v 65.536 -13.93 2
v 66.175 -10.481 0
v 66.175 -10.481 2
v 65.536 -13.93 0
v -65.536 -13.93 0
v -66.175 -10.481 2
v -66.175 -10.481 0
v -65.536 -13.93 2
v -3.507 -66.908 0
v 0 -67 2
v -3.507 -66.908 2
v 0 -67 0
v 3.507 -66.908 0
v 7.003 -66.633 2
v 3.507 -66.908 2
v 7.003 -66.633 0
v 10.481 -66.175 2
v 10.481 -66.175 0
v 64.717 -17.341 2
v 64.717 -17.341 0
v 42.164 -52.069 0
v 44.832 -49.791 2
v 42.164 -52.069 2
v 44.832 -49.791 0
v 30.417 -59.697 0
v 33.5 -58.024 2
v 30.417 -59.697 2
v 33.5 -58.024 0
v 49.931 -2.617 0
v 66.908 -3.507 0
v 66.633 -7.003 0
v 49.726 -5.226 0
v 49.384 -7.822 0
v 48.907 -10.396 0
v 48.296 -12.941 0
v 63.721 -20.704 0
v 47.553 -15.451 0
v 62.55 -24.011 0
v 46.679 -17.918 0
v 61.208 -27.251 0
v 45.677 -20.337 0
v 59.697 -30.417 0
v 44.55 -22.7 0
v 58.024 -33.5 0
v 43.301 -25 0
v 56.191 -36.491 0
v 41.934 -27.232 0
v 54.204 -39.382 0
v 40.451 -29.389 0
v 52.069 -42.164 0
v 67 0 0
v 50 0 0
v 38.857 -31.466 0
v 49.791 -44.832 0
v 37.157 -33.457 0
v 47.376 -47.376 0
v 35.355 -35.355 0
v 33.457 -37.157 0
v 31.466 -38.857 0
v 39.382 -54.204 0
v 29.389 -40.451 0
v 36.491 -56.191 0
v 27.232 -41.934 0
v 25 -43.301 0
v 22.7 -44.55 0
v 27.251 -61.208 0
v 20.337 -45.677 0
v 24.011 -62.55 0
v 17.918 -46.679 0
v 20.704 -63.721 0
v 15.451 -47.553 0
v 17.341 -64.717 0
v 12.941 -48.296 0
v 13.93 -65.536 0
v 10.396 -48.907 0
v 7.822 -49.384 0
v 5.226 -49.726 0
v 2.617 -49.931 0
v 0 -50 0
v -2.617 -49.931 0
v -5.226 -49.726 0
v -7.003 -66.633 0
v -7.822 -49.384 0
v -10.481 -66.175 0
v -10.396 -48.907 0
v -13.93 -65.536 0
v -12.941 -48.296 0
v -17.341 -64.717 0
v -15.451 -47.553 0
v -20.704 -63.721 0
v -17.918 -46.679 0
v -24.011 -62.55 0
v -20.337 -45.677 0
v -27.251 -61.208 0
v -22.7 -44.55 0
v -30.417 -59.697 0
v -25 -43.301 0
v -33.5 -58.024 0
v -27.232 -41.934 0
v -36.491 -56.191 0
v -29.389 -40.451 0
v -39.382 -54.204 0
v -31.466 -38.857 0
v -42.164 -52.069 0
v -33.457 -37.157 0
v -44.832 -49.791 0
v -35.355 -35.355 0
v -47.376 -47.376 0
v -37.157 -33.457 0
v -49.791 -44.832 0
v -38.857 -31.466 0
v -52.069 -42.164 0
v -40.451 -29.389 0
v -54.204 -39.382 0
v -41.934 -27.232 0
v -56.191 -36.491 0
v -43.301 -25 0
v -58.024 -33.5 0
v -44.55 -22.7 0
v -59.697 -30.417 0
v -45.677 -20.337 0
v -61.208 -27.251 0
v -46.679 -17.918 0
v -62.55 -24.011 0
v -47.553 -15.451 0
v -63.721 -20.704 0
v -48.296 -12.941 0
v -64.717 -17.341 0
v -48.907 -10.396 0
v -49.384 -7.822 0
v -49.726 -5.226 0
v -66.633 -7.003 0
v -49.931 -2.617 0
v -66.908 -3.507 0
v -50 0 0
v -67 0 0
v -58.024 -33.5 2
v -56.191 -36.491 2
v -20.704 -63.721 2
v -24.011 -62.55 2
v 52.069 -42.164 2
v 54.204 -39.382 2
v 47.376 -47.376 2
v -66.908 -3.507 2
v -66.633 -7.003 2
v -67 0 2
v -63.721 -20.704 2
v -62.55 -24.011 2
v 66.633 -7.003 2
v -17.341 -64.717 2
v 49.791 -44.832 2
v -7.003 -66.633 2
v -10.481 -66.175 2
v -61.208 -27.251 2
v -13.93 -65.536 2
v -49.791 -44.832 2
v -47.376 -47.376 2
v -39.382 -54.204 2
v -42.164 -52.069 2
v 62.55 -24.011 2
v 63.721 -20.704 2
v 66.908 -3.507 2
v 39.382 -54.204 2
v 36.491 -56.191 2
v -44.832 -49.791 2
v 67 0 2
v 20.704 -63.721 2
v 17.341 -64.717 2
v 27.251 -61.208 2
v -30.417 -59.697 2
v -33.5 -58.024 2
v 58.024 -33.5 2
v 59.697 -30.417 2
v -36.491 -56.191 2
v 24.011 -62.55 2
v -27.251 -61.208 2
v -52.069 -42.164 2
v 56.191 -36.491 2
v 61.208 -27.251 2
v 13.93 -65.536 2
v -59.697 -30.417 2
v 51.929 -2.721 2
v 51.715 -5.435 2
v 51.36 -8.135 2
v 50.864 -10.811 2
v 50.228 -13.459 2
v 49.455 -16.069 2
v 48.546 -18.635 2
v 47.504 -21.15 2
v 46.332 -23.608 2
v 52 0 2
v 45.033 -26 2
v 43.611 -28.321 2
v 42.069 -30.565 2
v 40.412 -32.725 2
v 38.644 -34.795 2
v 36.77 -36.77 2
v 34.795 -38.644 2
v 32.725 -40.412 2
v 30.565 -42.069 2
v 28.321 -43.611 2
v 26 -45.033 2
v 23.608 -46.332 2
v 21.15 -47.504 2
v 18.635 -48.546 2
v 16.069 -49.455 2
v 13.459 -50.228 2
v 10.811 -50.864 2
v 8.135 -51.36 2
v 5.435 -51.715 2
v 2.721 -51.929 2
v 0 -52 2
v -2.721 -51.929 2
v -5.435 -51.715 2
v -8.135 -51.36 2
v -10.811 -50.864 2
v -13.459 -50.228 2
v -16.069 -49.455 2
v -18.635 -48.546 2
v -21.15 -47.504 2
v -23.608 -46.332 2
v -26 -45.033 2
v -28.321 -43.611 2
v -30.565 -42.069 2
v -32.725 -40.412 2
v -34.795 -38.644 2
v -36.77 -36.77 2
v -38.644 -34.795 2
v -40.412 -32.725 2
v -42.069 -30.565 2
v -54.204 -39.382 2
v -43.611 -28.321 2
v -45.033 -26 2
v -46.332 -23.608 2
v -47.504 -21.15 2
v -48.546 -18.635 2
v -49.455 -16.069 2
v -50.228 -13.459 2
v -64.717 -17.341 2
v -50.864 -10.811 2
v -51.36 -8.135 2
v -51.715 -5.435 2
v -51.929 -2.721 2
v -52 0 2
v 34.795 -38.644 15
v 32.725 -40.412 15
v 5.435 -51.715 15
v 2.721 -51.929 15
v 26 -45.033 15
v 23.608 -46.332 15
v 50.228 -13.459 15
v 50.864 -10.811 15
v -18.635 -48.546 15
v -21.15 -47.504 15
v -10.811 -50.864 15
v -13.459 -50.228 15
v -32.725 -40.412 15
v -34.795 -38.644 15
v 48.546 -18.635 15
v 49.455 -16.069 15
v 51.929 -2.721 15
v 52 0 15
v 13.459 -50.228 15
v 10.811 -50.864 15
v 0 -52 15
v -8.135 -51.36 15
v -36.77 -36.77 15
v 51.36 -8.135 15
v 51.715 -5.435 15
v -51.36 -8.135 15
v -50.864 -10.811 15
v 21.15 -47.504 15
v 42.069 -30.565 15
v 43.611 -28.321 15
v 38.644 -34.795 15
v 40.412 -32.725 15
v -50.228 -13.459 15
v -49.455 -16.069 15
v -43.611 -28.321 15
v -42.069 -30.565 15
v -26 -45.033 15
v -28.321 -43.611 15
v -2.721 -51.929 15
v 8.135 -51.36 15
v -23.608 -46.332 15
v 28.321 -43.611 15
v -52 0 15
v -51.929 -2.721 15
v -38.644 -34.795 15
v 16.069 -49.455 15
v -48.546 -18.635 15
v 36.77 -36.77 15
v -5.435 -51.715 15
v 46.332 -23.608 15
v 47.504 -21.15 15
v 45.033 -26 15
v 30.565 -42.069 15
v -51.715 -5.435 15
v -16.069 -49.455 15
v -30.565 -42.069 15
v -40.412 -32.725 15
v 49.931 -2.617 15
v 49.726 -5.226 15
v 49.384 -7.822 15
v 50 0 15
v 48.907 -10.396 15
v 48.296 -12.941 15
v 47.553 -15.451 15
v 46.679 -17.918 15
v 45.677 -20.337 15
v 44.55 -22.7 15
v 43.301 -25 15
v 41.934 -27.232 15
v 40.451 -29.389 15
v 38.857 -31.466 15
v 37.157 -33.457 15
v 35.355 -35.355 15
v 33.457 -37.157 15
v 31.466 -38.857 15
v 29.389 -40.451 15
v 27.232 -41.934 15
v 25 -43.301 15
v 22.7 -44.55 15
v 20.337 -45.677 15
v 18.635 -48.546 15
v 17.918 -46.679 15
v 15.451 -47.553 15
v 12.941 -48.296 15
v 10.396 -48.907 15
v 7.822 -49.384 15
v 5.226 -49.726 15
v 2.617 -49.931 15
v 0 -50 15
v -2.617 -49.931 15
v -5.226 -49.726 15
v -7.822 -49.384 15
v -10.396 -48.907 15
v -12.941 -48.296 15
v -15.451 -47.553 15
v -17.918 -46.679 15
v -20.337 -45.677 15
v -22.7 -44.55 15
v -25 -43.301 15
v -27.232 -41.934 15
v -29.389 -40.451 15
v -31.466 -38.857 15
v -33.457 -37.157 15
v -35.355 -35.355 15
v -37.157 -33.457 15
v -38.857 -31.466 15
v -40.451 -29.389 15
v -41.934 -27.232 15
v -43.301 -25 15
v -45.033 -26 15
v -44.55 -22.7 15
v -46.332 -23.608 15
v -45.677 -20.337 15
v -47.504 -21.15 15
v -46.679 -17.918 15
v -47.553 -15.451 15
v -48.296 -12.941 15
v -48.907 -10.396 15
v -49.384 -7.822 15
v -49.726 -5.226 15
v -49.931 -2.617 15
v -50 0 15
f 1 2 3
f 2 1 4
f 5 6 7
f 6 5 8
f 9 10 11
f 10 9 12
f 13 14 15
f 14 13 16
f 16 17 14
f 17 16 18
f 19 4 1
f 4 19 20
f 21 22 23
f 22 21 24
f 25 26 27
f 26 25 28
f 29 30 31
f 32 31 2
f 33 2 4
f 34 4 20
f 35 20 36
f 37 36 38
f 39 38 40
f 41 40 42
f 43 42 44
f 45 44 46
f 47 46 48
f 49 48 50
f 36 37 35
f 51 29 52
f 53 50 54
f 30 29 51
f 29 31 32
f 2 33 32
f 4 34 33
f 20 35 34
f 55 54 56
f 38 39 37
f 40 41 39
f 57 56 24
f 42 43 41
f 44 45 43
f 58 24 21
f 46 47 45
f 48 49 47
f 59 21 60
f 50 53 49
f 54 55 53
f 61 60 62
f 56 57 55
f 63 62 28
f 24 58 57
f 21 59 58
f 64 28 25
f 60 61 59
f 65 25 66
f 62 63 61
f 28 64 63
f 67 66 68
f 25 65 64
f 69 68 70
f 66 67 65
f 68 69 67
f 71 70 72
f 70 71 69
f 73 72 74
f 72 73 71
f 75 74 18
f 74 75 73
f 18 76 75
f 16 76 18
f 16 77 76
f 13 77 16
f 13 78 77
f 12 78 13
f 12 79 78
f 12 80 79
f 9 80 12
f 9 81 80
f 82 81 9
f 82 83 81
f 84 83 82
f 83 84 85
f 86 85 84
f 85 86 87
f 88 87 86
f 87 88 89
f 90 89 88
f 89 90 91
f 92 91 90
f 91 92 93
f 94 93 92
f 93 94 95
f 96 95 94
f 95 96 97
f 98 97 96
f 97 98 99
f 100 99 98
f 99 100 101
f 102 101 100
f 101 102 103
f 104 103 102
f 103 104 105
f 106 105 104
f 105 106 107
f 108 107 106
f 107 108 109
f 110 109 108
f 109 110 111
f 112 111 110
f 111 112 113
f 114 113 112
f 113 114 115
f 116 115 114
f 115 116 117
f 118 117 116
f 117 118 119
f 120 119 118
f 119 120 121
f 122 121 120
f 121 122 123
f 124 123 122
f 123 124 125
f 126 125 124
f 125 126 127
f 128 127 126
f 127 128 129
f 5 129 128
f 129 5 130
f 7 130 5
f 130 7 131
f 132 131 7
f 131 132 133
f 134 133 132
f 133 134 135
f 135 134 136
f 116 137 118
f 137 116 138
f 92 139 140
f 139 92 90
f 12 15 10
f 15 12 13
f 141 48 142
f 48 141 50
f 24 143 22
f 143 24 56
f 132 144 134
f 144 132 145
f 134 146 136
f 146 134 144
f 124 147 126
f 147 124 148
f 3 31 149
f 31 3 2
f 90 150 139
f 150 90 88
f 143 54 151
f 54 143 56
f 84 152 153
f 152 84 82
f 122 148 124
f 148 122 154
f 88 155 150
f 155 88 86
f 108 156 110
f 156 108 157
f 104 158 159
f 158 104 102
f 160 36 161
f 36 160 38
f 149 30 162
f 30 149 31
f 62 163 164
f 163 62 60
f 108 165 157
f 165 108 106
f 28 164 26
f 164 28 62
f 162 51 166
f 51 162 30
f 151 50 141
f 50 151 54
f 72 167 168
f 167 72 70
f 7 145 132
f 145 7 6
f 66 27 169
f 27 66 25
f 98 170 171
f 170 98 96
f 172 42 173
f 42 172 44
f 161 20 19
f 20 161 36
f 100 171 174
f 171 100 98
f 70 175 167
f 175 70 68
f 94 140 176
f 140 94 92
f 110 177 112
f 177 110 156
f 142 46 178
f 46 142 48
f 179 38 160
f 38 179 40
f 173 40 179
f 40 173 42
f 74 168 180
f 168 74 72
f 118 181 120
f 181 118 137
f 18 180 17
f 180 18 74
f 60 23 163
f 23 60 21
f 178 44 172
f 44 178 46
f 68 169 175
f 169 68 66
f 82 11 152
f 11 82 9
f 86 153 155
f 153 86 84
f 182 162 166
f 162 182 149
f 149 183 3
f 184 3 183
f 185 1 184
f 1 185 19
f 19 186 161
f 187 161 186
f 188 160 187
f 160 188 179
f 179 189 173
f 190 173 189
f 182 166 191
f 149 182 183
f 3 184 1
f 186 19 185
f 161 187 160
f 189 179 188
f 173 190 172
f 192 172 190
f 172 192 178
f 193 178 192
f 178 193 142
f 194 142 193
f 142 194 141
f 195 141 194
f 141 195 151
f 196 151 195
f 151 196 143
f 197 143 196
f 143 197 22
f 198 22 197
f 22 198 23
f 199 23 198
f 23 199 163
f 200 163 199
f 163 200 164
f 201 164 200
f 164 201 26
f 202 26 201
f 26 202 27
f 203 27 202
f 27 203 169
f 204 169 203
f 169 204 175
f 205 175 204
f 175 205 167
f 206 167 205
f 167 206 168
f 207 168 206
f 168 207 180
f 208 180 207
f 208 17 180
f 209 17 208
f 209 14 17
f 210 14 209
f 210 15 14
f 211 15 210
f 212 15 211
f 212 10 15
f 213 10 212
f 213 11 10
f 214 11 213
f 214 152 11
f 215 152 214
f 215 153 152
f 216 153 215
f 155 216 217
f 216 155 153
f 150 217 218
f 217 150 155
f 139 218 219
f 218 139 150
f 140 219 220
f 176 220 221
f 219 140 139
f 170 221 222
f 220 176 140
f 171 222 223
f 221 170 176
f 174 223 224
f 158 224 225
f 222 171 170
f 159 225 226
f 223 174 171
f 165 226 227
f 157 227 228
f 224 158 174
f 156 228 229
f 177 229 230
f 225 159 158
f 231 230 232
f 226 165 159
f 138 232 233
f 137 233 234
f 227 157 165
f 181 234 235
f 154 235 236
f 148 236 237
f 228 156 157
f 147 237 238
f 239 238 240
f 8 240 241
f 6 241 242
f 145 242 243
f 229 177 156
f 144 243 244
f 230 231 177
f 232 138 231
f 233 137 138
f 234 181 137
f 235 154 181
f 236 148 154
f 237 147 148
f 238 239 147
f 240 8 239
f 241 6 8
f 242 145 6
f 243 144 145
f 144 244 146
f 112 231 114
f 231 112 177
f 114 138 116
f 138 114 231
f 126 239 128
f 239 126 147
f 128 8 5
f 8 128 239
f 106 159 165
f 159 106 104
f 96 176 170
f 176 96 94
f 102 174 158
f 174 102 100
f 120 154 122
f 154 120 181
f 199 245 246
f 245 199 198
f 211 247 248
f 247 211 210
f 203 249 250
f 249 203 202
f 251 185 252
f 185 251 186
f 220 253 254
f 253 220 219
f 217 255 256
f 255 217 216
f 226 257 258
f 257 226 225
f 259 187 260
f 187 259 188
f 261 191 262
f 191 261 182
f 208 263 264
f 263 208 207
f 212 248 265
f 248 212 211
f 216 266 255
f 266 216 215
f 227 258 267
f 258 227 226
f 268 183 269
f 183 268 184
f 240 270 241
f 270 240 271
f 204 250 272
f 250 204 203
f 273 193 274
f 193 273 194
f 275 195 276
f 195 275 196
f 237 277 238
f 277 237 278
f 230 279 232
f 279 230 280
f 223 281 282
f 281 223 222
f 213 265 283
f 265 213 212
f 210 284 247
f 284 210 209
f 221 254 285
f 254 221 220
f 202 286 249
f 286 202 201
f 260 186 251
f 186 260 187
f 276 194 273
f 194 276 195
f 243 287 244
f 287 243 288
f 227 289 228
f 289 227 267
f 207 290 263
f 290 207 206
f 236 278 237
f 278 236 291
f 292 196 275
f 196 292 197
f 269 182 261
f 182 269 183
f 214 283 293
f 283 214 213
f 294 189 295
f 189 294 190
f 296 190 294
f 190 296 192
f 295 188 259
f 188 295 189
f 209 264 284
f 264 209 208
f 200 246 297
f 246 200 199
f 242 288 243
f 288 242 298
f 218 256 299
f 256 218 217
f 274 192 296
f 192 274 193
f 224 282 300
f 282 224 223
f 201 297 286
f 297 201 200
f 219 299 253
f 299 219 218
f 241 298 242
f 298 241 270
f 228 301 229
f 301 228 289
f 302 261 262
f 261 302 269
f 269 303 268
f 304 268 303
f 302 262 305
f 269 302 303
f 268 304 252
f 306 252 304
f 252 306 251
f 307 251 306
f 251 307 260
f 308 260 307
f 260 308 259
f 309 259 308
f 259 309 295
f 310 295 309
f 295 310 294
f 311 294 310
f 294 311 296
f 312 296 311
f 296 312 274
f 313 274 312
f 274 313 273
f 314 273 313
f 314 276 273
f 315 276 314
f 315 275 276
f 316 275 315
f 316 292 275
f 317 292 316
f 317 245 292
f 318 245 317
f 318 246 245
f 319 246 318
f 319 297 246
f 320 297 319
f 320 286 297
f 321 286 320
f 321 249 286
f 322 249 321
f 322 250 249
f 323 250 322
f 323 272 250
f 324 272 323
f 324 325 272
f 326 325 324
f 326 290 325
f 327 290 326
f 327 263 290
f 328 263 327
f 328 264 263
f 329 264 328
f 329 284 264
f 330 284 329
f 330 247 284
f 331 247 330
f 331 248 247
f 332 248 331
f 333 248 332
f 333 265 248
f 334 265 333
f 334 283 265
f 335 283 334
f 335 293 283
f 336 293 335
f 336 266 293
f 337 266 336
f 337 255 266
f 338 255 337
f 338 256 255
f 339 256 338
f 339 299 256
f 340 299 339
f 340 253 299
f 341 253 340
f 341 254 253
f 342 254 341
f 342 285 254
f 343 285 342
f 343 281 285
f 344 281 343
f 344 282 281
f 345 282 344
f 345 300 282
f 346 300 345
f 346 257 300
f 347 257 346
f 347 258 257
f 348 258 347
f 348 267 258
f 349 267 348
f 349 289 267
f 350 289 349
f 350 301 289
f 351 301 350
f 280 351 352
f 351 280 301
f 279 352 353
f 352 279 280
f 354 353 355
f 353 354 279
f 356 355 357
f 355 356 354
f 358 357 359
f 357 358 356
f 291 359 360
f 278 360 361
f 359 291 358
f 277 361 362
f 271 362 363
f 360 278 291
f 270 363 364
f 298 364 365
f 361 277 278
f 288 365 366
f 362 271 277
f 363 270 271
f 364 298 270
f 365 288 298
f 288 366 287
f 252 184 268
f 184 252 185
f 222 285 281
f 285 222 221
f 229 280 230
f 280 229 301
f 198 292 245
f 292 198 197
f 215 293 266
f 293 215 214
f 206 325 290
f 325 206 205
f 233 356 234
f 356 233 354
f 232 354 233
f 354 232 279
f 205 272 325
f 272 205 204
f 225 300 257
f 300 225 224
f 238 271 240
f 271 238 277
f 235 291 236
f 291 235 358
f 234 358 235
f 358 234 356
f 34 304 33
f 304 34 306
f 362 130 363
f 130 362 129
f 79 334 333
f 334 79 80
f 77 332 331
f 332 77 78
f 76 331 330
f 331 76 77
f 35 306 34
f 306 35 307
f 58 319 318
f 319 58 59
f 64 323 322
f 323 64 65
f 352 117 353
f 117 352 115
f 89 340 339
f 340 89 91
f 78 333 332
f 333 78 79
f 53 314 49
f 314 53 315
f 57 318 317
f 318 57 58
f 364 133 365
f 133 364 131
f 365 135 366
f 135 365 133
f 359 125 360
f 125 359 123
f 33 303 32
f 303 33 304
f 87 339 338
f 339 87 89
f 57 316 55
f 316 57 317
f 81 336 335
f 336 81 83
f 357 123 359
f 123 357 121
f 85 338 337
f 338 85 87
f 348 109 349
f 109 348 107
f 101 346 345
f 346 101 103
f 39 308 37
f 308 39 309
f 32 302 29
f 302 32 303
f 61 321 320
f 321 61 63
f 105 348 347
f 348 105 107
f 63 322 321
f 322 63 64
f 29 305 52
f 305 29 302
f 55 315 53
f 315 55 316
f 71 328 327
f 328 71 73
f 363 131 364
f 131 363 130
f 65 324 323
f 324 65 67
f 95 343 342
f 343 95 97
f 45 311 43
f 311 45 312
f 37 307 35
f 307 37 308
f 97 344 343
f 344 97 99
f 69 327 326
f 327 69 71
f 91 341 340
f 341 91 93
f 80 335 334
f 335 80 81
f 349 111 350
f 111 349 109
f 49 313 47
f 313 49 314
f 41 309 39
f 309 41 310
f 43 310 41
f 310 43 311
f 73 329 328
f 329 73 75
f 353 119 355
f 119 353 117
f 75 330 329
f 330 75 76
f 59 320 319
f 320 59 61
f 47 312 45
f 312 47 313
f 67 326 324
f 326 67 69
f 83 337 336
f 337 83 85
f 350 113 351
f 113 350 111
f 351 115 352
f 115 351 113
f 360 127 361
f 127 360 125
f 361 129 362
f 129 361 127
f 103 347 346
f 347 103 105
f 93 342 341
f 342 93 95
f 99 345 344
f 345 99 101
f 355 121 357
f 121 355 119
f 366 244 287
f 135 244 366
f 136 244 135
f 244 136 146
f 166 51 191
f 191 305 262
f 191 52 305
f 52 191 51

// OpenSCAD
// general size flange 
// July 5, 2013
// R Lazure

Inside_Diameter=100;//[10:200]
Flange_Lip=15;//[5,10,15,20,25,30]
Edge_Height=15;//[5,10,15,20,25,30]
$fa=2+1;
thickness=1.95+.05;
OD= Inside_Diameter+2*Flange_Lip+2*thickness;
ODrad= OD/2;
IDrad= Inside_Diameter/2;
innerrad= IDrad+thickness;

intersection(){
	translate([-ODrad-15,-OD-30,0]) cube(OD+30,OD+30,OD+30);
 difference() {
   union(){
     cylinder(thickness, ODrad, ODrad);
    cylinder(Edge_Height, innerrad, innerrad);
          }
   translate([0,0,-10]) cylinder(Edge_Height+20,Inside_Diameter/2,Inside_Diameter/2);
             }
		}

 
